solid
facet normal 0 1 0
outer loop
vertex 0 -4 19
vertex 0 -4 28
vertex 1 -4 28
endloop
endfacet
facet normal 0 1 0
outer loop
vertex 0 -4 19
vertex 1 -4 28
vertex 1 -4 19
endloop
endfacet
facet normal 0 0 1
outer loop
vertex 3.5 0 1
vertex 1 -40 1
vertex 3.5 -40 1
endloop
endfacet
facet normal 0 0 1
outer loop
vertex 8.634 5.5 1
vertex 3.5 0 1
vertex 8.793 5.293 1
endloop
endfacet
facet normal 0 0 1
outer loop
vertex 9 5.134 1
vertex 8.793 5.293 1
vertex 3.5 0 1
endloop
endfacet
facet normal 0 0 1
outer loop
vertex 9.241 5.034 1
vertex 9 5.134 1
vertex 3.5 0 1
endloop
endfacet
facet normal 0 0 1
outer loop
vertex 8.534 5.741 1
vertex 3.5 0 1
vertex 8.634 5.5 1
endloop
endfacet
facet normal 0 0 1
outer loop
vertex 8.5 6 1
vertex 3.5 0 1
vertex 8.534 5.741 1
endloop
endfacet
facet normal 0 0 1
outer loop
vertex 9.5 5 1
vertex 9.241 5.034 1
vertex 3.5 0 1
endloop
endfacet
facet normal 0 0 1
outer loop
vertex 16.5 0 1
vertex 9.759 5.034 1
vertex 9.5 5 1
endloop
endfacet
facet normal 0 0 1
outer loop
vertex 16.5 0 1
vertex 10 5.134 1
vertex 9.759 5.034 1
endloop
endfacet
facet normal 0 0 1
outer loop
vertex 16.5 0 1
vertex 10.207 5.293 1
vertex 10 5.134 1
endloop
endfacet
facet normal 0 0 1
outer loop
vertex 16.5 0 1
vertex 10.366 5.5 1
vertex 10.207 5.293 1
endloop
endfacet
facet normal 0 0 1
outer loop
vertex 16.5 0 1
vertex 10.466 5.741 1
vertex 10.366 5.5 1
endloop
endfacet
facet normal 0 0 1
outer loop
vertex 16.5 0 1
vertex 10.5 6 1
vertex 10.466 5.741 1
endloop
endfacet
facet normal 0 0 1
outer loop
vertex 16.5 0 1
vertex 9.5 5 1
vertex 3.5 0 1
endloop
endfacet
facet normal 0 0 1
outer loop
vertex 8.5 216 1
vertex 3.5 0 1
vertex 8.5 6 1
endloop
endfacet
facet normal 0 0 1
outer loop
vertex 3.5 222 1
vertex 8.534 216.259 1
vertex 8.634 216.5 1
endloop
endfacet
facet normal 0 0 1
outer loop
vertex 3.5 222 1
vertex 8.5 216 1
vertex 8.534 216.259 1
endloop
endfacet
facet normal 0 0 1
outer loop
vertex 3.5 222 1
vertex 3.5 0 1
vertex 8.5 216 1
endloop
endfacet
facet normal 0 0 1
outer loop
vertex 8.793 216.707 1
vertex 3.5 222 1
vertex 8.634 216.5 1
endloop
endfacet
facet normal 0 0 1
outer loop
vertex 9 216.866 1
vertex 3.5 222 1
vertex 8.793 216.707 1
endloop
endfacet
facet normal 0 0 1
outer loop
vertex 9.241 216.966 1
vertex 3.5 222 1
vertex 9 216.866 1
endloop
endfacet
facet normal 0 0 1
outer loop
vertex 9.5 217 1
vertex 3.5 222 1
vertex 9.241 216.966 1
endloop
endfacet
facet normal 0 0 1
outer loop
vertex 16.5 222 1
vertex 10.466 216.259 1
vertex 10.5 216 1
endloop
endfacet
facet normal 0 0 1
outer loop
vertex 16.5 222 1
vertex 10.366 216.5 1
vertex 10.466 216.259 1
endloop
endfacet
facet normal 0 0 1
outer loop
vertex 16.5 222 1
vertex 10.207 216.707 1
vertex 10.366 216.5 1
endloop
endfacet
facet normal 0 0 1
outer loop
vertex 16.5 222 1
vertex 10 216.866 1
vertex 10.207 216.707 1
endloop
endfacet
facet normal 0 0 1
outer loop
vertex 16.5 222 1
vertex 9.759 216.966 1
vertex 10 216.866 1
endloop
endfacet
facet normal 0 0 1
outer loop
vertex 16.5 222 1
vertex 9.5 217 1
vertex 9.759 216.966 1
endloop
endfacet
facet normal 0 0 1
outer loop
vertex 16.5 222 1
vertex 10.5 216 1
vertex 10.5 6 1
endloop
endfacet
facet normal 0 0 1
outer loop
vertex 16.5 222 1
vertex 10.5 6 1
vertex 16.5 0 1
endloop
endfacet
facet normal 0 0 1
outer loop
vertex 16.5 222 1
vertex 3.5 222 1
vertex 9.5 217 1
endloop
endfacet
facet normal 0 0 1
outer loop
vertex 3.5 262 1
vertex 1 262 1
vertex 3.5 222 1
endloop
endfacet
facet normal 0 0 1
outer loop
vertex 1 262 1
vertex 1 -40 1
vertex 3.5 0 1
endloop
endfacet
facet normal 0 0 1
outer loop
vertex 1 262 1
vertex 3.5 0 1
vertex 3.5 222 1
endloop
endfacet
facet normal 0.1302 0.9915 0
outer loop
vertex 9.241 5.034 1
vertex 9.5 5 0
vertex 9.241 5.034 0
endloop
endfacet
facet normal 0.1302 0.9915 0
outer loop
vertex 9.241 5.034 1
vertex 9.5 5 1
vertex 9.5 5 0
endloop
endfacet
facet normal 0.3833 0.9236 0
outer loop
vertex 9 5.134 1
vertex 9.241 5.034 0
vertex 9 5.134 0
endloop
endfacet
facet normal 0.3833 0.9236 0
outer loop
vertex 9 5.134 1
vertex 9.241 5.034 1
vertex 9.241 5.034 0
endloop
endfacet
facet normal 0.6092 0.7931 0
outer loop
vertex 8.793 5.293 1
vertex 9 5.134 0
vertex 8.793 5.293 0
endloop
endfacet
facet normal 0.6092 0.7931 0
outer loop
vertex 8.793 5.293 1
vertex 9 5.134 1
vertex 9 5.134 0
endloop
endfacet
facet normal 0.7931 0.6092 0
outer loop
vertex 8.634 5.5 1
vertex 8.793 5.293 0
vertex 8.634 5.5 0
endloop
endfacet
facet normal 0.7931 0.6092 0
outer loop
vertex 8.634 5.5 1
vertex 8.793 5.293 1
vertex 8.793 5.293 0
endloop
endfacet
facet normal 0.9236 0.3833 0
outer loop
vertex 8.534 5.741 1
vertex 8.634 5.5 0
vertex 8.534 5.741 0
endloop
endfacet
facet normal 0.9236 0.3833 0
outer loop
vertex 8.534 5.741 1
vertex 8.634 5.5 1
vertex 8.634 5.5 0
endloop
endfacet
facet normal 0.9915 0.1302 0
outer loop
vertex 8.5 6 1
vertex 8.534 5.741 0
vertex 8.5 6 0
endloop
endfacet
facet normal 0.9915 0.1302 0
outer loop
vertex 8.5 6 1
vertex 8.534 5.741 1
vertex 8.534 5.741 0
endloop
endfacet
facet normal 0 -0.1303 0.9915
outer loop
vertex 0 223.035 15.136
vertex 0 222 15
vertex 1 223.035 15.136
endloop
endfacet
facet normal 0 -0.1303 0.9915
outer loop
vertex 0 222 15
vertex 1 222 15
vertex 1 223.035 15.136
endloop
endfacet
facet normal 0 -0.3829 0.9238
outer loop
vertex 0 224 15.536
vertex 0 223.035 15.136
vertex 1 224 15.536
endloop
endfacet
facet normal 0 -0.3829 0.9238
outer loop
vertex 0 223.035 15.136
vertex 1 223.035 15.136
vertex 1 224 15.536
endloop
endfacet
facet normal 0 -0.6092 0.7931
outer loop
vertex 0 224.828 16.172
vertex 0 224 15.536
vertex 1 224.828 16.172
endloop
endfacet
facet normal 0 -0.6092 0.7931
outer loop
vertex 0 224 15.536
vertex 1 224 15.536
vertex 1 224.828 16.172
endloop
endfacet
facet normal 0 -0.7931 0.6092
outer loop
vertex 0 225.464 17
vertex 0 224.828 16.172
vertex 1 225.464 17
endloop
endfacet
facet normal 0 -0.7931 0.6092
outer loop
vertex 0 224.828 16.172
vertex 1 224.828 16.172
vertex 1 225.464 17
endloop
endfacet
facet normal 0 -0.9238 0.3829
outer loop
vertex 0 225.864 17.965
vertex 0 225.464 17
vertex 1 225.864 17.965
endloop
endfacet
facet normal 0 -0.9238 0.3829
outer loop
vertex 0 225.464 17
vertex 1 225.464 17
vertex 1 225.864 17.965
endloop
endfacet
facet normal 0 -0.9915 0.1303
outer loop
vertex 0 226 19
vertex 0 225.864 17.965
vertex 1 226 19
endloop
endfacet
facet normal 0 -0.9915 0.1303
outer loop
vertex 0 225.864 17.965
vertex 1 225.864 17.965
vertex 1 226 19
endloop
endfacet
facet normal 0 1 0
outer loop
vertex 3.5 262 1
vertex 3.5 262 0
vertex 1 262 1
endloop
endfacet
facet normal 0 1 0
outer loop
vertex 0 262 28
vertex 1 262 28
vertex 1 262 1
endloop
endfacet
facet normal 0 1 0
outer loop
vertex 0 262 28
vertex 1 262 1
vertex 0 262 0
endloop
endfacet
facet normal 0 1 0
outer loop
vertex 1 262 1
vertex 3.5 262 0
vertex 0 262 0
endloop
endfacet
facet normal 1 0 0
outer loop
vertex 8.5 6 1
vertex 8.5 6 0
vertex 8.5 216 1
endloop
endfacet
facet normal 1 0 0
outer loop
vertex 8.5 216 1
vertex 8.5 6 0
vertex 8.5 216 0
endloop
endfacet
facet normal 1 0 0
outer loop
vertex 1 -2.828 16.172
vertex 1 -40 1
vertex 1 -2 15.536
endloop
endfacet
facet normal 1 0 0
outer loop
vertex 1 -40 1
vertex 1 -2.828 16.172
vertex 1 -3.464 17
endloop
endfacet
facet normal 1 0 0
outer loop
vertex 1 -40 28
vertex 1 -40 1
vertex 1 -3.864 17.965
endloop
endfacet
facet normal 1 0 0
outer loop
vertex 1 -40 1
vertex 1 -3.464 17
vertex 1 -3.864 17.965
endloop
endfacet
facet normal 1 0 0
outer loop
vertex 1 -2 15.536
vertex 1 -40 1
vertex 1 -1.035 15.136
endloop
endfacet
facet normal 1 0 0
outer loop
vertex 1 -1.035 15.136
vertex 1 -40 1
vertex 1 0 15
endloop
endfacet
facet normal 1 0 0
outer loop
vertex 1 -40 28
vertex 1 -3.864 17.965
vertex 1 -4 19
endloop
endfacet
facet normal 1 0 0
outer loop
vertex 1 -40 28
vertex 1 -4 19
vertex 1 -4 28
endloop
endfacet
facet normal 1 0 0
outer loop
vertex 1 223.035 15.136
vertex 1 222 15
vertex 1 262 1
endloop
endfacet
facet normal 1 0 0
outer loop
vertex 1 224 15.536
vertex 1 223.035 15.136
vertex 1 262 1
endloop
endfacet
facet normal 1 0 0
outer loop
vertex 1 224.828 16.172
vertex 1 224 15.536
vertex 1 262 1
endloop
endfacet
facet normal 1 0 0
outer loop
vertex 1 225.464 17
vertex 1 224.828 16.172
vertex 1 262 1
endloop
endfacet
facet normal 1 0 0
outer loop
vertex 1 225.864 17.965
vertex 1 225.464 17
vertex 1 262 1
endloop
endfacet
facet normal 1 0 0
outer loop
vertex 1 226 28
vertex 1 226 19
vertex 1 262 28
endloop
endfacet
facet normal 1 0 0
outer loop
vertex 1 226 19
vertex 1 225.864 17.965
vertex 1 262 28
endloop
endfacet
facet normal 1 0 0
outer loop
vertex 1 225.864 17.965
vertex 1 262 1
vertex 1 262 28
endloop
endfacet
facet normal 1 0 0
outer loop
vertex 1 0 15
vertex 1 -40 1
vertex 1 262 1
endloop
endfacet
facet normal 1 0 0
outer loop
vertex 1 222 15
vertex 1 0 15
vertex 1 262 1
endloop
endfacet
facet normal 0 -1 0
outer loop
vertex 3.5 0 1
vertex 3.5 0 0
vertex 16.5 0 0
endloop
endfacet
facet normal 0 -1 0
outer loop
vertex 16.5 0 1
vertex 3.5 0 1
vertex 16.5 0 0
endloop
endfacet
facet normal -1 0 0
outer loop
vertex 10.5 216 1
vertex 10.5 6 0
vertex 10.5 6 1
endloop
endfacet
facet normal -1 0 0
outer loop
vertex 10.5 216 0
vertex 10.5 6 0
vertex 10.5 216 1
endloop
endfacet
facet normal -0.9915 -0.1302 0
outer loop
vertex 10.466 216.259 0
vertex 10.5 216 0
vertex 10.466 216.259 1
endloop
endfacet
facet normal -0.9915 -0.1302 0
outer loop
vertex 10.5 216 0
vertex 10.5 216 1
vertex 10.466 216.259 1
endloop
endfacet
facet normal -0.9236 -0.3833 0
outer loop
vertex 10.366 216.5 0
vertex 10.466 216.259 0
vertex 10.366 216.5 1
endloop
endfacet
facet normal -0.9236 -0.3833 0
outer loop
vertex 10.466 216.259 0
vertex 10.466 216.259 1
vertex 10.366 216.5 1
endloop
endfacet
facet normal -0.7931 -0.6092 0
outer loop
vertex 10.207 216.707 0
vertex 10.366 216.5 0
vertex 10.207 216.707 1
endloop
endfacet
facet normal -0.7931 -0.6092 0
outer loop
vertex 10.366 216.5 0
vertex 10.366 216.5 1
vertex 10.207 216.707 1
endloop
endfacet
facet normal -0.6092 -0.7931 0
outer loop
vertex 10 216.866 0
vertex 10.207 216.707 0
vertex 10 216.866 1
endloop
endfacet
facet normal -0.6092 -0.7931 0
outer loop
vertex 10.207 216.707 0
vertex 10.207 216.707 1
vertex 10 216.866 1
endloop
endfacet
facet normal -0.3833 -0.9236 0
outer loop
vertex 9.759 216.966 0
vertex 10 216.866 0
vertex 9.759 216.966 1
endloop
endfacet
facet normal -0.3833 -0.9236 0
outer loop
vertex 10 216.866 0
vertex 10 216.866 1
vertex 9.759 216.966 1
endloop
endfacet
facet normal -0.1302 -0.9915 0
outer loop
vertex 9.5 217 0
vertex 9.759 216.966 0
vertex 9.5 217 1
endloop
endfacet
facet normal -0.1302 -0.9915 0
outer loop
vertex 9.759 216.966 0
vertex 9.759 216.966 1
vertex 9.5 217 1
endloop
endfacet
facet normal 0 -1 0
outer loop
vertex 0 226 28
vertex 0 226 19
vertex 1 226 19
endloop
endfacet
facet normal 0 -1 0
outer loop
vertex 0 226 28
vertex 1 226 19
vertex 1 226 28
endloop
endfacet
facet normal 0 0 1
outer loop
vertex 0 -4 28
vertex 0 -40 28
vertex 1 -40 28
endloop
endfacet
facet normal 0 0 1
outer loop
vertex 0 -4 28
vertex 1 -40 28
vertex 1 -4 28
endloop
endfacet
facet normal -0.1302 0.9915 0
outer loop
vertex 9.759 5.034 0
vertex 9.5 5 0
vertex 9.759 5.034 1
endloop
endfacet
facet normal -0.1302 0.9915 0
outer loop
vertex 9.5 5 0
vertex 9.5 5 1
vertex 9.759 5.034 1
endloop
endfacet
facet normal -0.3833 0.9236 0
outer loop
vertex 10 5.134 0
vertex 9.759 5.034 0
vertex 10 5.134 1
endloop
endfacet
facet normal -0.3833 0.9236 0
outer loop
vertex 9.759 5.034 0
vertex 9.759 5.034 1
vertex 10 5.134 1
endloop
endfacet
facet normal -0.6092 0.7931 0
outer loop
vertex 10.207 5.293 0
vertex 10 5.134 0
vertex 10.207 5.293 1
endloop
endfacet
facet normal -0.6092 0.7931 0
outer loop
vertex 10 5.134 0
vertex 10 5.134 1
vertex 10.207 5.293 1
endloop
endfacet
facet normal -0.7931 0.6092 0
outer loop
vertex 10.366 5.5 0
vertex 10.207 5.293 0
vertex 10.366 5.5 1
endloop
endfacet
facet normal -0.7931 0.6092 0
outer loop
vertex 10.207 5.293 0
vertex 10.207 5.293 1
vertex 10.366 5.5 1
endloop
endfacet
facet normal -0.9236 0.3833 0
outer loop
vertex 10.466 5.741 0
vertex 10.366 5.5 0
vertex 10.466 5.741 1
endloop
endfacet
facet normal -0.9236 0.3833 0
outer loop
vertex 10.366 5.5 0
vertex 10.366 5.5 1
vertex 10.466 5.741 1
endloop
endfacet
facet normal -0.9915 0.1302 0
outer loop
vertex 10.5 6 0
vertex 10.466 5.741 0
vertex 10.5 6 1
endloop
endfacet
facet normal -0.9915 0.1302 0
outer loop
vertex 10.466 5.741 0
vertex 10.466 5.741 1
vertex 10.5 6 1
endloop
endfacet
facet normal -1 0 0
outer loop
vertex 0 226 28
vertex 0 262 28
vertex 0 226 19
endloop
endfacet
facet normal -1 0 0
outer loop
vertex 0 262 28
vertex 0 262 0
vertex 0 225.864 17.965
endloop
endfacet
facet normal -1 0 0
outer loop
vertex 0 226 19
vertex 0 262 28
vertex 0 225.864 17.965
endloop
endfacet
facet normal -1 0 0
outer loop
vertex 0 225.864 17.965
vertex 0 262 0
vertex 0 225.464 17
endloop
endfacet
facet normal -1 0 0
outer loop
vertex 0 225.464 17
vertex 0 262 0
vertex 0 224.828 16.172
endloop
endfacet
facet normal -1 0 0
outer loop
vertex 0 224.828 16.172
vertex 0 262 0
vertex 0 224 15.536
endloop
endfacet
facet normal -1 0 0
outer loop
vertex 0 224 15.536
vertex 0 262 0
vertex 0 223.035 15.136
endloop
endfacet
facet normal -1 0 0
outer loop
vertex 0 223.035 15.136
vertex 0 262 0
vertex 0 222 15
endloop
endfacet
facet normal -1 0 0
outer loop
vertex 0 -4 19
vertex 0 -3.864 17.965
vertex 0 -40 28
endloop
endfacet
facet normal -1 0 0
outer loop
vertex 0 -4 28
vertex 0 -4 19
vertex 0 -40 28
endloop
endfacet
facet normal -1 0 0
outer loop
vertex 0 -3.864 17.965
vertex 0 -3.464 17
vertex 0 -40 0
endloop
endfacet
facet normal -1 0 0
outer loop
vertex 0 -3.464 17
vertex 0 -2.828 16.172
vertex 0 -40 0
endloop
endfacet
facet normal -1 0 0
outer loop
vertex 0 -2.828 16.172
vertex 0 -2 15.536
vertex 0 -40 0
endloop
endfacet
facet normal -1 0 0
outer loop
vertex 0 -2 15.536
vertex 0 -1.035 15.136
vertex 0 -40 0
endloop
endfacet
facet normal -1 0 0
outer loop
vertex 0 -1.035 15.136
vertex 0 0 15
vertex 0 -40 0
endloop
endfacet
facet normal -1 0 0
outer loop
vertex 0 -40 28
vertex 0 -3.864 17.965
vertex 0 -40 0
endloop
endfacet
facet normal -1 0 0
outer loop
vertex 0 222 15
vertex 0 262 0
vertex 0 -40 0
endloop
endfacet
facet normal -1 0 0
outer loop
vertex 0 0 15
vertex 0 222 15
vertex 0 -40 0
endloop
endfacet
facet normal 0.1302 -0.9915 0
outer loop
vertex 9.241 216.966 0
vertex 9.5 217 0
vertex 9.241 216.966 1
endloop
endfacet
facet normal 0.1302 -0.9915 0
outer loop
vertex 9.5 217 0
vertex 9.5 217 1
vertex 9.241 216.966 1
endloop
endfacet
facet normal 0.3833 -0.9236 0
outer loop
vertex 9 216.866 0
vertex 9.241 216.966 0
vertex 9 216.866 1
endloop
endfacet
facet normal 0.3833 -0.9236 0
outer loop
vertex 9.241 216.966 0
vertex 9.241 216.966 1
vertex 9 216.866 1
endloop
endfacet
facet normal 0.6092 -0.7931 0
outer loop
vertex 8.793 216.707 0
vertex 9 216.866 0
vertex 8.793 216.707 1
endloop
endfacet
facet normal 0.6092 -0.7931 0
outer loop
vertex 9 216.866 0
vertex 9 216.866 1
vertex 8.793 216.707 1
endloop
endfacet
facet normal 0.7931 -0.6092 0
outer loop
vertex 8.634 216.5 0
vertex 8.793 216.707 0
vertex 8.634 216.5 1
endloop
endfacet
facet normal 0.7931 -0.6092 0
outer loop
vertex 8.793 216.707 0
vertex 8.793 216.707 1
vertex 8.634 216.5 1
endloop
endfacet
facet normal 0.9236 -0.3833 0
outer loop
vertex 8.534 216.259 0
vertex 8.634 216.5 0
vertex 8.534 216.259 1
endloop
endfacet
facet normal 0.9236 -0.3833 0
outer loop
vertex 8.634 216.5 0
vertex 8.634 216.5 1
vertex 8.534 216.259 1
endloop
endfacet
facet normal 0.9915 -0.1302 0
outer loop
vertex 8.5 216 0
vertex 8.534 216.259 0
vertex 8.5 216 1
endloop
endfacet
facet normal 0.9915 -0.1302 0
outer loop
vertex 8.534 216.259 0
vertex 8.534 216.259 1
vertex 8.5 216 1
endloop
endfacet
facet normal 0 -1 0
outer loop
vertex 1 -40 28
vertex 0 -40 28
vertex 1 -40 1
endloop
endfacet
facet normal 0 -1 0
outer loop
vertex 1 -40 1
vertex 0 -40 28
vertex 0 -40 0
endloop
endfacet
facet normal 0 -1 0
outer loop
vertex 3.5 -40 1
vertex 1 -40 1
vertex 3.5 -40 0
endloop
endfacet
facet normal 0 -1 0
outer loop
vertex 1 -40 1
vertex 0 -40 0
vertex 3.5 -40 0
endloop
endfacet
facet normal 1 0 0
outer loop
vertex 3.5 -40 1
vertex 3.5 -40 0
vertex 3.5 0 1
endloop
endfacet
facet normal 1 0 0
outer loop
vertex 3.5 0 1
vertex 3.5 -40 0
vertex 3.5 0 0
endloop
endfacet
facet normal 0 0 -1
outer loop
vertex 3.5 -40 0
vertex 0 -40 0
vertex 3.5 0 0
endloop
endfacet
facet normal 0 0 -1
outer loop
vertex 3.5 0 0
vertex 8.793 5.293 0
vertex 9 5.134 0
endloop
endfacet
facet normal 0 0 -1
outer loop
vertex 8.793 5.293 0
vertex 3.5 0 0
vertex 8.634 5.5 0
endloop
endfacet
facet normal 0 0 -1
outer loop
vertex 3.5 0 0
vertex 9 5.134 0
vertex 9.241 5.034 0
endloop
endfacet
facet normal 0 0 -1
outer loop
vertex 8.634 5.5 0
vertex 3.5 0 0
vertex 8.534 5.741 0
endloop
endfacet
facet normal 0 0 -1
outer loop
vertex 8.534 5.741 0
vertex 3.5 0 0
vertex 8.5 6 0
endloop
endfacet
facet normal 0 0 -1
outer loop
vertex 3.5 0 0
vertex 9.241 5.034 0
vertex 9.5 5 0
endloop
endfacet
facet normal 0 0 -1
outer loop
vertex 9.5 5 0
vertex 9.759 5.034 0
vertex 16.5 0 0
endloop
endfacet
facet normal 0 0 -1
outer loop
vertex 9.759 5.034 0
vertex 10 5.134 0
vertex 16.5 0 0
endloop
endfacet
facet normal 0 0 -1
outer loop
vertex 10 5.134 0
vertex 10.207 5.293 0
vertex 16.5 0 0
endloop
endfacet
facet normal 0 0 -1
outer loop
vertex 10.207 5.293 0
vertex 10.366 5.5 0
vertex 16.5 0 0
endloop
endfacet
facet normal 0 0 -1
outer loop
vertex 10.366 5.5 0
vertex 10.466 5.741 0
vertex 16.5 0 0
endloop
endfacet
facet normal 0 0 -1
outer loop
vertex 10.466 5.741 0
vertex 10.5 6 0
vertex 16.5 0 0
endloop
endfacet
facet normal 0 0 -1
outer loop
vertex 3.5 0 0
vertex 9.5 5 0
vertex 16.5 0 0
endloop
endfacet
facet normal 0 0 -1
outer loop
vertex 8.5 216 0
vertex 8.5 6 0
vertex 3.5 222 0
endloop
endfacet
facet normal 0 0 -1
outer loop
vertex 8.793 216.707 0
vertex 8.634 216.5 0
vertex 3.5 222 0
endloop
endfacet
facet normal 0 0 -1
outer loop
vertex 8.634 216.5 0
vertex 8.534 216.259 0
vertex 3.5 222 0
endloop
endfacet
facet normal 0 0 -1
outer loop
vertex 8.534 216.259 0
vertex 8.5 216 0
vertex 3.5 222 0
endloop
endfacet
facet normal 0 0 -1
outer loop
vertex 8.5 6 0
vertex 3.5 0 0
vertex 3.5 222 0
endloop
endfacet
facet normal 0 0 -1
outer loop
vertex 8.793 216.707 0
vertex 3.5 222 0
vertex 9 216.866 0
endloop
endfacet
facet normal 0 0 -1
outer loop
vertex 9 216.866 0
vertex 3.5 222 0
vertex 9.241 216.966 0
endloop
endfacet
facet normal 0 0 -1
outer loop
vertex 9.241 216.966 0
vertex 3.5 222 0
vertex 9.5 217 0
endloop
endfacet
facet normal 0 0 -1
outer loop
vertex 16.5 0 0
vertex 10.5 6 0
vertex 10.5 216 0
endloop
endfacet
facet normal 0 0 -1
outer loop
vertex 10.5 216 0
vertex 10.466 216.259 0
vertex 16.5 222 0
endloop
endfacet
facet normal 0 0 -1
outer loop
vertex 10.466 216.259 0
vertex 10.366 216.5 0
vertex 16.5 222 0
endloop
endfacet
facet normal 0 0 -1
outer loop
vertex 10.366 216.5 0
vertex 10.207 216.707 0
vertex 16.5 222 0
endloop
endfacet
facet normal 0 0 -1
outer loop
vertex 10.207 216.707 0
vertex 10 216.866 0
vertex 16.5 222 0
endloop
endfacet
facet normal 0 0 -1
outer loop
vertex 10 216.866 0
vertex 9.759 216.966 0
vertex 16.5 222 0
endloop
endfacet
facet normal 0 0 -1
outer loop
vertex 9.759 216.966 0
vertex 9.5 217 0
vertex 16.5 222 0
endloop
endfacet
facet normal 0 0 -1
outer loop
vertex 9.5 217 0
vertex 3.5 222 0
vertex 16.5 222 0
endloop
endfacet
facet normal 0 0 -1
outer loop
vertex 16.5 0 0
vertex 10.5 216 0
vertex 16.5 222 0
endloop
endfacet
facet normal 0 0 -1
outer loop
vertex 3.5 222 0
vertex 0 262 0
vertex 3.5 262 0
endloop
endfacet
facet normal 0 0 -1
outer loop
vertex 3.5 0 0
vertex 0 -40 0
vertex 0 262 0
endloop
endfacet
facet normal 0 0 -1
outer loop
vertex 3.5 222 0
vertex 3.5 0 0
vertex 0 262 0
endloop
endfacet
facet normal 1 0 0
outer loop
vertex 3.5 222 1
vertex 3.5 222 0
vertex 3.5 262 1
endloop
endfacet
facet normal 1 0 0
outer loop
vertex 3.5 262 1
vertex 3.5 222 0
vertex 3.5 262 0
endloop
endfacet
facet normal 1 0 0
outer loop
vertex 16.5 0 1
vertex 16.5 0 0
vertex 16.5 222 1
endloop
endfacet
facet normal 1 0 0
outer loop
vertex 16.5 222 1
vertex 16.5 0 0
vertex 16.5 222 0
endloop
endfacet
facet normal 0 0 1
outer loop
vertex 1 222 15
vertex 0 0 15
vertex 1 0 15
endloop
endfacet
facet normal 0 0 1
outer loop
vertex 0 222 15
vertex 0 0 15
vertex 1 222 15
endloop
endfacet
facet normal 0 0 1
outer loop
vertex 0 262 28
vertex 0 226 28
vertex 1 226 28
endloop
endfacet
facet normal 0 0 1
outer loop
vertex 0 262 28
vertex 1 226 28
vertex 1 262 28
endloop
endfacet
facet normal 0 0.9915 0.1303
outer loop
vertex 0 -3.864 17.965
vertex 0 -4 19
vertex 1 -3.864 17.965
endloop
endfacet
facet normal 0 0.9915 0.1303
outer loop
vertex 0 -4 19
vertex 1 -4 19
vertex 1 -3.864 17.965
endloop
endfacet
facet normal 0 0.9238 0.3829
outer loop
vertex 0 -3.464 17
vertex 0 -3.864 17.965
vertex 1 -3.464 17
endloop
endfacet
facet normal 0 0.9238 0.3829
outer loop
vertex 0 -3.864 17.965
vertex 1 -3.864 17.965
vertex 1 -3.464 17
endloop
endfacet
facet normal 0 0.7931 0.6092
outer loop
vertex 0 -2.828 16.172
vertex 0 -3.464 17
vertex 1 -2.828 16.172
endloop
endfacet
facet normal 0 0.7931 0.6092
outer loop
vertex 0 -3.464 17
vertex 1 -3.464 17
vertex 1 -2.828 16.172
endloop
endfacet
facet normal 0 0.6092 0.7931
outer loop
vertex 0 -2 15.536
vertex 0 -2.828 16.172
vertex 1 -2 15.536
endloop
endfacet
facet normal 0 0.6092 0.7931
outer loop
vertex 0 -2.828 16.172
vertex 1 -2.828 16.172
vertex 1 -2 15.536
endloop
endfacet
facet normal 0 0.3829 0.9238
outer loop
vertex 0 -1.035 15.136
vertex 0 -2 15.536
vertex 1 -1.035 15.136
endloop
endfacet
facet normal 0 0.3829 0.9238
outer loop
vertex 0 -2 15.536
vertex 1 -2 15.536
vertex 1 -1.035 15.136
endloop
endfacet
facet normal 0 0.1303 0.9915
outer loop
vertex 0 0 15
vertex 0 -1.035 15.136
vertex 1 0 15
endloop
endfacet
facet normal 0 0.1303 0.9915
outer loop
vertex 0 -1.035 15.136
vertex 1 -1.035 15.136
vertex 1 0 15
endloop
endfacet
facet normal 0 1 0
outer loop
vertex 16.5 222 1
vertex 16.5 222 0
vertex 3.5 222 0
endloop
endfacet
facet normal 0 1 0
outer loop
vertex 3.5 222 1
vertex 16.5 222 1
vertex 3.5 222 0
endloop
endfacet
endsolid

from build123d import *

# Parameters (mm, degrees)
SKETCH_1_W      = 2
SKETCH_1_H      = 212
EXTRUDE_1_DEPTH = 1
FILLET_1_R      = 1
EXTRUDE_2_DEPTH = 1
FILLET_2_R      = 4


with BuildPart() as part:
    # Эскиз1 → Бобышка-Вытянуть1 (new body)
    with BuildSketch(Plane.XY):
        Polygon((3.5, 0), (16.5, 0), (16.5, 222), (3.5, 222), (3.5, 262), (0, 262), (0, 222), (0, 0), (0, -40), (3.5, -40), align=None)
        with Locations((9.5, 111)):
            Rectangle(SKETCH_1_W, SKETCH_1_H, mode=Mode.SUBTRACT)
    extrude(amount=EXTRUDE_1_DEPTH)

    # Скругление1
    fillet_1_edges = [part.edges().sort_by_distance(p)[0] for p in [
        (8.5, 5, 0.5),
        (10.5, 5, 0.5),
        (10.5, 217, 0.5),
        (8.5, 217, 0.5),
    ]]
    fillet(fillet_1_edges, radius=FILLET_1_R - 0.0001)  # a hair under: the kernel refuses the full size

    # Эскиз2 → Бобышка-Вытянуть2 (add)
    with BuildSketch(Plane.ZY):
        Polygon((0, -40), (28, -40), (28, -4), (15, -4), (15, 226), (28, 226), (28, 262), (0, 262), align=None)
    extrude(amount=-EXTRUDE_2_DEPTH)

    # Скругление2
    fillet_2_edges = [part.edges().sort_by_distance(p)[0] for p in [
        (0.5, 226, 15),
        (0.5, -4, 15),
    ]]
    fillet(fillet_2_edges, radius=FILLET_2_R)


solid = part.part
